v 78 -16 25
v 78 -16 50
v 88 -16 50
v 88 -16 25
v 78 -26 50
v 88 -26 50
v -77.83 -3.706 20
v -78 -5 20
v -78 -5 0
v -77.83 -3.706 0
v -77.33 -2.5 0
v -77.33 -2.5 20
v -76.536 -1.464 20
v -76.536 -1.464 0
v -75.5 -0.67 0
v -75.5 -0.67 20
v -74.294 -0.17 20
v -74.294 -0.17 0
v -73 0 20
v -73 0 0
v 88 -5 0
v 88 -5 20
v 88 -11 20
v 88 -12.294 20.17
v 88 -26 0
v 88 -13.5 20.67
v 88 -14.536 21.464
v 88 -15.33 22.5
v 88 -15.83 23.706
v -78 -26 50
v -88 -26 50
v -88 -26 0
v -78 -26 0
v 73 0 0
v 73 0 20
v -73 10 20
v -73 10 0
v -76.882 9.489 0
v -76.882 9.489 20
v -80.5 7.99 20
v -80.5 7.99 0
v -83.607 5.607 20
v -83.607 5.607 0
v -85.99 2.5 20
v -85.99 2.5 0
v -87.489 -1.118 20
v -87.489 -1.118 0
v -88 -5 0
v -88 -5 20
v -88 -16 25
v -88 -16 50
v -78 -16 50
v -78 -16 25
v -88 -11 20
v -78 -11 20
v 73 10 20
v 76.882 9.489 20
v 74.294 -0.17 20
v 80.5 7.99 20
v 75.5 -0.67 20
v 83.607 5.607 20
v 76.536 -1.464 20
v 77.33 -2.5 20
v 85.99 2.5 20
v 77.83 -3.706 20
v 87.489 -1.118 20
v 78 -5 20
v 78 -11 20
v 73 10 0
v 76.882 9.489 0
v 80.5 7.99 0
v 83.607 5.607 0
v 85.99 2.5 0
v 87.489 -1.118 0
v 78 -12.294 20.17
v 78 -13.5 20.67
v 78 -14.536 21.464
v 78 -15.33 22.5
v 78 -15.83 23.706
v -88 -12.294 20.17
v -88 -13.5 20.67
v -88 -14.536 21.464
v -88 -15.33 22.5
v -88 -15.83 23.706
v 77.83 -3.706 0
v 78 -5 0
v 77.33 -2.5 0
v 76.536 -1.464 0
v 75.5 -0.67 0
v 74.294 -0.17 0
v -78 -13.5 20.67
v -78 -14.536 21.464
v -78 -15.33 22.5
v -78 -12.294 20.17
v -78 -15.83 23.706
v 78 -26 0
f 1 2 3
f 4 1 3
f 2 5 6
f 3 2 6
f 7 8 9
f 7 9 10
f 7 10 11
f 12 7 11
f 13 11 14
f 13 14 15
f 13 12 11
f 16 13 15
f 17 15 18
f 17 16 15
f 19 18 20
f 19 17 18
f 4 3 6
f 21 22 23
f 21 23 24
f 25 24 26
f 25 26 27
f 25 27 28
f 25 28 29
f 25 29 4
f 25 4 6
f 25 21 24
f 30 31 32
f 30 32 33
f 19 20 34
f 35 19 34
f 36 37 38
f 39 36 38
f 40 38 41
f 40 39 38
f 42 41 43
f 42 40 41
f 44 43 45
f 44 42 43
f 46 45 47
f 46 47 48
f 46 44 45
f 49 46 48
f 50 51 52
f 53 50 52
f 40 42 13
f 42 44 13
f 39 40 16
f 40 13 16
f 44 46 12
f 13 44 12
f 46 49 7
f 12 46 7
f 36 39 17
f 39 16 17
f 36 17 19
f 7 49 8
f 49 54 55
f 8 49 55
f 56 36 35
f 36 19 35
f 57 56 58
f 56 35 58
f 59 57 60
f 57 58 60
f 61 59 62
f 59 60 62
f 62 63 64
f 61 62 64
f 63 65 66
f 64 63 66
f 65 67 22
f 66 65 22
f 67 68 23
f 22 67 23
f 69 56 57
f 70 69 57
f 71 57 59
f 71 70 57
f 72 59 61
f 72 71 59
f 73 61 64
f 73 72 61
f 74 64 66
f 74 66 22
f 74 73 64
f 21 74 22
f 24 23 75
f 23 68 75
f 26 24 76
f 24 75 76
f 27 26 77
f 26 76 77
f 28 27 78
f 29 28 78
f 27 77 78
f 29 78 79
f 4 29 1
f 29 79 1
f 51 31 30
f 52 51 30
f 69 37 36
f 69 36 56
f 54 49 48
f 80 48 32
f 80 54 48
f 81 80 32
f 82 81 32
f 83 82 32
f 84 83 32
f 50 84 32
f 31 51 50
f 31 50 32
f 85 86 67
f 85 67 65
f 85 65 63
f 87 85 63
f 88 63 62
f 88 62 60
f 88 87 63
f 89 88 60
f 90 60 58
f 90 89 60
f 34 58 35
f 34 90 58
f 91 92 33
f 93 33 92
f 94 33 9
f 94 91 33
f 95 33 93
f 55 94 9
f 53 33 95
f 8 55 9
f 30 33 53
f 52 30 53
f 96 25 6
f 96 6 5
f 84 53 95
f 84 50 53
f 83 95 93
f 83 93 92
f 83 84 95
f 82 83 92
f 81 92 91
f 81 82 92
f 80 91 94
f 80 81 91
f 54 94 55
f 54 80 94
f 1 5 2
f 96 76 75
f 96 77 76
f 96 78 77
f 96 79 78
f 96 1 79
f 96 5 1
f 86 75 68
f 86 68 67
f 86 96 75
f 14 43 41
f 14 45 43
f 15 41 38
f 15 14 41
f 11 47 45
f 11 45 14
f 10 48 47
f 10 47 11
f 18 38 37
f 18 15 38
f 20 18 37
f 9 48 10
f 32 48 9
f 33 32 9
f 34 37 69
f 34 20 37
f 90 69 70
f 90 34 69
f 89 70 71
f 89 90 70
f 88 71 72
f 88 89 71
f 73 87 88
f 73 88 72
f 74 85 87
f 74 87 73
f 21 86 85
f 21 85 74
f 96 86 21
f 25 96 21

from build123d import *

# Parameters (mm, degrees)
SKETCH2_W                      = 156
SKETCH2_H                      = 20
BASE_FLANGE1_DEPTH             = 10
EDGE_FLANGE1_STRIP_W           = 50
EDGE_FLANGE1_STRIP_H           = 10
EDGE_FLANGE1_STRIP_CUT_DEPTH   = 20
EDGE_FLANGE1_STRIP_2_W         = 50
EDGE_FLANGE1_STRIP_2_H         = 10
EDGE_FLANGE1_STRIP_CUT_2_DEPTH = 20
EDGE_FLANGE1_DEPTH             = 20
EDGE_FLANGE1_BEND_DEPTH        = 20
SKETCH15_W                     = 10
SKETCH15_H                     = 50
BOSS_EXTRUDE1_DEPTH            = 10
FILLET3_R                      = 5


# Sheet-metal steps are written as plain solids
with BuildPart() as part:
    # Sketch2 → Base-Flange1 (new body)
    with BuildSketch(Plane(origin=(0, 0, 0), x_dir=(1, 0, 0), z_dir=(0, 1, 0))):
        with Locations((0, -10)):
            Rectangle(SKETCH2_W, SKETCH2_H)
    extrude(amount=BASE_FLANGE1_DEPTH)

    # Edge-Flange1 strip (across the edge) → Edge-Flange1 strip cut (cut)
    with BuildSketch(Plane(origin=(-78, 0, 20), x_dir=(1, 0, 0), z_dir=(0, 0, -1))):
        with Locations((-20, -5)):
            Rectangle(EDGE_FLANGE1_STRIP_W, EDGE_FLANGE1_STRIP_H)
    extrude(amount=EDGE_FLANGE1_STRIP_CUT_DEPTH, mode=Mode.SUBTRACT)

    # Edge-Flange1 strip 2 (across the edge) → Edge-Flange1 strip cut 2 (cut)
    with BuildSketch(Plane(origin=(78, 0, 0), x_dir=(-1, 0, 0), z_dir=(0, 0, 1))):
        with Locations((-20, -5)):
            Rectangle(EDGE_FLANGE1_STRIP_2_W, EDGE_FLANGE1_STRIP_2_H)
    extrude(amount=EDGE_FLANGE1_STRIP_CUT_2_DEPTH, mode=Mode.SUBTRACT)

    # Edge-Flange1 section (across the edge) → Edge-Flange1 (add)
    with BuildSketch(Plane(origin=(-78, 0, 20), x_dir=(1, 0, 0), z_dir=(0, 0, -1))):
        with BuildLine():
            Line((-10, 5), (-10, 26))
            Line((-10, 26), (0, 26))
            Line((0, 26), (0, 5))
            ThreePointArc((0, 5), (1.464466094, 1.464466094), (5, 0))
            Line((5, 0), (5, -10))
            ThreePointArc((5, -10), (-5.606601718, -5.606601718), (-10, 5))
        make_face()
    extrude(amount=EDGE_FLANGE1_DEPTH)

    # Edge-Flange1 section 2 (across the edge) → Edge-Flange1 bend (add)
    with BuildSketch(Plane(origin=(78, 0, 0), x_dir=(-1, 0, 0), z_dir=(0, 0, 1))):
        with BuildLine():
            Line((-10, 5), (-10, 26))
            Line((-10, 26), (0, 26))
            Line((0, 26), (0, 5))
            ThreePointArc((0, 5), (1.464466094, 1.464466094), (5, 0))
            Line((5, 0), (5, -10))
            ThreePointArc((5, -10), (-5.606601718, -5.606601718), (-10, 5))
        make_face()
    extrude(amount=EDGE_FLANGE1_BEND_DEPTH)

    # Sketch15 → Boss-Extrude1 (add)
    with BuildSketch(Plane.XZ.offset(26)):
        with Locations((-83, 25)):
            Rectangle(SKETCH15_W, SKETCH15_H)
        with Locations((83, 25)):
            Rectangle(SKETCH15_W, SKETCH15_H)
    extrude(amount=-BOSS_EXTRUDE1_DEPTH)

    # Fillet3
    fillet3_edges = [part.edges().sort_by_distance(p)[0] for p in [
        (83, -16, 20),
        (-83, -16, 20),
    ]]
    fillet(fillet3_edges, radius=FILLET3_R)


solid = part.part
